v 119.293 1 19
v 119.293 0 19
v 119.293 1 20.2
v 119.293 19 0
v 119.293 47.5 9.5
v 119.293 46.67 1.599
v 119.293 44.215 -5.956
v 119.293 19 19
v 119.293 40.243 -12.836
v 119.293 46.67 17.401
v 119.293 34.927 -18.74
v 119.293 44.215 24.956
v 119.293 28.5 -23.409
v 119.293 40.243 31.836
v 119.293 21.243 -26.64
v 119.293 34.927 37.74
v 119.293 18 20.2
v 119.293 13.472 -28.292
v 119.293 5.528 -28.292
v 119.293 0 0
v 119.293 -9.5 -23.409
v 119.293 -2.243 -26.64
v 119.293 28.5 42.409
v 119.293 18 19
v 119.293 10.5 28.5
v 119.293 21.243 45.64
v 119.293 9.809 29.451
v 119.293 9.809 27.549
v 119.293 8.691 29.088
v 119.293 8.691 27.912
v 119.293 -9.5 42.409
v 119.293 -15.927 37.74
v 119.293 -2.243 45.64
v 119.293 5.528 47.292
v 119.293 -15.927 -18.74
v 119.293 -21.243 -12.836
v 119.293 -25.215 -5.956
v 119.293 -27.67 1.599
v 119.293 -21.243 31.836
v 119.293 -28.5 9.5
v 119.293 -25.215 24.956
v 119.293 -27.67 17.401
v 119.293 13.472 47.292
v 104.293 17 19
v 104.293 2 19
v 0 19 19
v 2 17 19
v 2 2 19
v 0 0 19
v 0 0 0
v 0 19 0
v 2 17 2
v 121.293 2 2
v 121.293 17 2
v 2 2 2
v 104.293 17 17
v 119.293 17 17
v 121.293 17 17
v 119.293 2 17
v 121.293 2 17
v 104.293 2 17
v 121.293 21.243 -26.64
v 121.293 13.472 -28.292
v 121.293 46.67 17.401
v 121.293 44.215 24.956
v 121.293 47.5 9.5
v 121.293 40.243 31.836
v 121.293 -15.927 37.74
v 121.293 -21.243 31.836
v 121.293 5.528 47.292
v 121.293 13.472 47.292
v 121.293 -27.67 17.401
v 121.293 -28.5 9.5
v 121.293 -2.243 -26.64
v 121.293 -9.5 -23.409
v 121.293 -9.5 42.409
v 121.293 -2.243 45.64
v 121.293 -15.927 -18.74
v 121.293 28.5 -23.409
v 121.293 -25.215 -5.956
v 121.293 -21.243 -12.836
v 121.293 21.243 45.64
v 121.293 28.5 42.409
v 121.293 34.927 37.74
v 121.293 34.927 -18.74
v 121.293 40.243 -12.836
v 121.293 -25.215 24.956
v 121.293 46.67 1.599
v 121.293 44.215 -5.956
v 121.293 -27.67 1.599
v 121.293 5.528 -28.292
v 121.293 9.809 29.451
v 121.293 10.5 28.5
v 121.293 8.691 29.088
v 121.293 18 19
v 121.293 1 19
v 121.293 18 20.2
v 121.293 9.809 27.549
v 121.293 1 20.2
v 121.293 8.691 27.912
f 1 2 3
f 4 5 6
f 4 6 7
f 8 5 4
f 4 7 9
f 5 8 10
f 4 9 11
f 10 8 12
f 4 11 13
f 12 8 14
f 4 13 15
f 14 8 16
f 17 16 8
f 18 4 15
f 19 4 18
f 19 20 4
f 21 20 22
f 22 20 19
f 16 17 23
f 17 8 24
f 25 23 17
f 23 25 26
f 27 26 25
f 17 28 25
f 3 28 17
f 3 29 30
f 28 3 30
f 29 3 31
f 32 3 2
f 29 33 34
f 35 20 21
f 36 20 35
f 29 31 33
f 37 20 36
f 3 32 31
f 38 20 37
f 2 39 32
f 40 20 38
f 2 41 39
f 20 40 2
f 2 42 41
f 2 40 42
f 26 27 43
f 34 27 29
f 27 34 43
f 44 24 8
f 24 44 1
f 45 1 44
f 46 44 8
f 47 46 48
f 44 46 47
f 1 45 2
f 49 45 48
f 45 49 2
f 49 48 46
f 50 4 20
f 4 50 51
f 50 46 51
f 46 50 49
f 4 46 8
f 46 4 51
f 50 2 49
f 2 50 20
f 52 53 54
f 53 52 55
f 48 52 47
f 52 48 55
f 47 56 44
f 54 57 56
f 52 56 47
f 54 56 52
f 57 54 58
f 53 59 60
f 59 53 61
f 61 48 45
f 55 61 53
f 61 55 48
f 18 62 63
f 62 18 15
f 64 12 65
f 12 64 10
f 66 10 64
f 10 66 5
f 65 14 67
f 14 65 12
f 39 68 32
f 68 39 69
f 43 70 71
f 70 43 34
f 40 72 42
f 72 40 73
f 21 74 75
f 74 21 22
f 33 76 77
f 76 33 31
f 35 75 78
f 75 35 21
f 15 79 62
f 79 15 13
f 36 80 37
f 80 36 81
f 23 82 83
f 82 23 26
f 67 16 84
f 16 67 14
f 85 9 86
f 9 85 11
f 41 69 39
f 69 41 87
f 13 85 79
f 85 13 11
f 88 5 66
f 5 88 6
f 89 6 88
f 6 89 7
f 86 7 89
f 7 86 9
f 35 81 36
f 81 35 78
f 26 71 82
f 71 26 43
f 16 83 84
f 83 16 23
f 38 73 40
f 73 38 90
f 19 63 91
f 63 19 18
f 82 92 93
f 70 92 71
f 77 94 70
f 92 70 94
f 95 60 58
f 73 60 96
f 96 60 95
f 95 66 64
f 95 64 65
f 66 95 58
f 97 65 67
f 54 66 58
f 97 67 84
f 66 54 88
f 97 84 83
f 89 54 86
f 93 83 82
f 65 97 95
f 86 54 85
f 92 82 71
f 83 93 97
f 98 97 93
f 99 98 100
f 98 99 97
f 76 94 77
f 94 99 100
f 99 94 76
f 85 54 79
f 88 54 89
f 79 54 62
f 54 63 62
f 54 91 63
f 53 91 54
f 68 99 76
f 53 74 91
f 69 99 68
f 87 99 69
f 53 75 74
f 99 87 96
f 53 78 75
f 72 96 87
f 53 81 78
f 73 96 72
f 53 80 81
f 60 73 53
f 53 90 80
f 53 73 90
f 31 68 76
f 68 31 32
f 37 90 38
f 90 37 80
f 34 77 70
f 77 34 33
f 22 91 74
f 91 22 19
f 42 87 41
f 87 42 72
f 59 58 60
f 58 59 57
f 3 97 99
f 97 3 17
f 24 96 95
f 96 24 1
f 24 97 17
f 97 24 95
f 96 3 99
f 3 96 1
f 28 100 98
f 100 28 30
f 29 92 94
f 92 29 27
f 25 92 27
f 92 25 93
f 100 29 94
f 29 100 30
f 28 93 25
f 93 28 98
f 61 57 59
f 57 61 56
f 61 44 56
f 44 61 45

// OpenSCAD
//Parameters (get estimates from reed pipe spreadsheet)
//All measurements in mm

//Extend length by 33%
//Use square cross-section
//Walls are all 2mm and overlap with reed width

//Assuming a brass "reed"

Reed_length = 89.47; //estimated oscillating length

Reed_width = 17;
Reed_thickness = 1.2;
wall_thickness = 2;
wire_diameter = 2;

//Intermediate parameters (calculated)

Channel_length = Reed_length*(4/3);
Channel_side_out= Reed_width+(wall_thickness);
Channel_side_in= Reed_width- (wall_thickness);
SU=Channel_side_out/2;
wire_radius = wire_diameter/2;


//Rendering

//Shallot

difference(){
    
    cube([Channel_length, Channel_side_out, Channel_side_out]);

    translate([wall_thickness,wall_thickness,wall_thickness])
        cube([Channel_length, Channel_side_in, 2*Channel_side_in]);
}


difference(){
    
    //Boot cap
    translate([Channel_length,SU,SU])
        rotate([90,0,90])
            cylinder(h=wall_thickness,r1=SU*4,r2=SU*4);
    
    //Sounding hole
    translate([Channel_length-(wall_thickness/2),wall_thickness,wall_thickness])
        cube([wall_thickness*2,Channel_side_in, Channel_side_in]);
    
    //Reed slot
    translate([Channel_length-(wall_thickness/2),wall_thickness/2,SU*2])
        cube([wall_thickness*2,Reed_width, Reed_thickness]);
    
    //Wire hole
    translate([Channel_length-(wall_thickness/2),SU,SU*3])
        rotate([90,0,90])
            cylinder(h=wall_thickness*2,r1=wire_radius,r2=wire_radius);

}

//Little shallot cover thingy
translate([Channel_length-Channel_side_in,wall_thickness,wall_thickness+Channel_side_in])
    cube([Channel_side_in, Channel_side_in,wall_thickness,]);
